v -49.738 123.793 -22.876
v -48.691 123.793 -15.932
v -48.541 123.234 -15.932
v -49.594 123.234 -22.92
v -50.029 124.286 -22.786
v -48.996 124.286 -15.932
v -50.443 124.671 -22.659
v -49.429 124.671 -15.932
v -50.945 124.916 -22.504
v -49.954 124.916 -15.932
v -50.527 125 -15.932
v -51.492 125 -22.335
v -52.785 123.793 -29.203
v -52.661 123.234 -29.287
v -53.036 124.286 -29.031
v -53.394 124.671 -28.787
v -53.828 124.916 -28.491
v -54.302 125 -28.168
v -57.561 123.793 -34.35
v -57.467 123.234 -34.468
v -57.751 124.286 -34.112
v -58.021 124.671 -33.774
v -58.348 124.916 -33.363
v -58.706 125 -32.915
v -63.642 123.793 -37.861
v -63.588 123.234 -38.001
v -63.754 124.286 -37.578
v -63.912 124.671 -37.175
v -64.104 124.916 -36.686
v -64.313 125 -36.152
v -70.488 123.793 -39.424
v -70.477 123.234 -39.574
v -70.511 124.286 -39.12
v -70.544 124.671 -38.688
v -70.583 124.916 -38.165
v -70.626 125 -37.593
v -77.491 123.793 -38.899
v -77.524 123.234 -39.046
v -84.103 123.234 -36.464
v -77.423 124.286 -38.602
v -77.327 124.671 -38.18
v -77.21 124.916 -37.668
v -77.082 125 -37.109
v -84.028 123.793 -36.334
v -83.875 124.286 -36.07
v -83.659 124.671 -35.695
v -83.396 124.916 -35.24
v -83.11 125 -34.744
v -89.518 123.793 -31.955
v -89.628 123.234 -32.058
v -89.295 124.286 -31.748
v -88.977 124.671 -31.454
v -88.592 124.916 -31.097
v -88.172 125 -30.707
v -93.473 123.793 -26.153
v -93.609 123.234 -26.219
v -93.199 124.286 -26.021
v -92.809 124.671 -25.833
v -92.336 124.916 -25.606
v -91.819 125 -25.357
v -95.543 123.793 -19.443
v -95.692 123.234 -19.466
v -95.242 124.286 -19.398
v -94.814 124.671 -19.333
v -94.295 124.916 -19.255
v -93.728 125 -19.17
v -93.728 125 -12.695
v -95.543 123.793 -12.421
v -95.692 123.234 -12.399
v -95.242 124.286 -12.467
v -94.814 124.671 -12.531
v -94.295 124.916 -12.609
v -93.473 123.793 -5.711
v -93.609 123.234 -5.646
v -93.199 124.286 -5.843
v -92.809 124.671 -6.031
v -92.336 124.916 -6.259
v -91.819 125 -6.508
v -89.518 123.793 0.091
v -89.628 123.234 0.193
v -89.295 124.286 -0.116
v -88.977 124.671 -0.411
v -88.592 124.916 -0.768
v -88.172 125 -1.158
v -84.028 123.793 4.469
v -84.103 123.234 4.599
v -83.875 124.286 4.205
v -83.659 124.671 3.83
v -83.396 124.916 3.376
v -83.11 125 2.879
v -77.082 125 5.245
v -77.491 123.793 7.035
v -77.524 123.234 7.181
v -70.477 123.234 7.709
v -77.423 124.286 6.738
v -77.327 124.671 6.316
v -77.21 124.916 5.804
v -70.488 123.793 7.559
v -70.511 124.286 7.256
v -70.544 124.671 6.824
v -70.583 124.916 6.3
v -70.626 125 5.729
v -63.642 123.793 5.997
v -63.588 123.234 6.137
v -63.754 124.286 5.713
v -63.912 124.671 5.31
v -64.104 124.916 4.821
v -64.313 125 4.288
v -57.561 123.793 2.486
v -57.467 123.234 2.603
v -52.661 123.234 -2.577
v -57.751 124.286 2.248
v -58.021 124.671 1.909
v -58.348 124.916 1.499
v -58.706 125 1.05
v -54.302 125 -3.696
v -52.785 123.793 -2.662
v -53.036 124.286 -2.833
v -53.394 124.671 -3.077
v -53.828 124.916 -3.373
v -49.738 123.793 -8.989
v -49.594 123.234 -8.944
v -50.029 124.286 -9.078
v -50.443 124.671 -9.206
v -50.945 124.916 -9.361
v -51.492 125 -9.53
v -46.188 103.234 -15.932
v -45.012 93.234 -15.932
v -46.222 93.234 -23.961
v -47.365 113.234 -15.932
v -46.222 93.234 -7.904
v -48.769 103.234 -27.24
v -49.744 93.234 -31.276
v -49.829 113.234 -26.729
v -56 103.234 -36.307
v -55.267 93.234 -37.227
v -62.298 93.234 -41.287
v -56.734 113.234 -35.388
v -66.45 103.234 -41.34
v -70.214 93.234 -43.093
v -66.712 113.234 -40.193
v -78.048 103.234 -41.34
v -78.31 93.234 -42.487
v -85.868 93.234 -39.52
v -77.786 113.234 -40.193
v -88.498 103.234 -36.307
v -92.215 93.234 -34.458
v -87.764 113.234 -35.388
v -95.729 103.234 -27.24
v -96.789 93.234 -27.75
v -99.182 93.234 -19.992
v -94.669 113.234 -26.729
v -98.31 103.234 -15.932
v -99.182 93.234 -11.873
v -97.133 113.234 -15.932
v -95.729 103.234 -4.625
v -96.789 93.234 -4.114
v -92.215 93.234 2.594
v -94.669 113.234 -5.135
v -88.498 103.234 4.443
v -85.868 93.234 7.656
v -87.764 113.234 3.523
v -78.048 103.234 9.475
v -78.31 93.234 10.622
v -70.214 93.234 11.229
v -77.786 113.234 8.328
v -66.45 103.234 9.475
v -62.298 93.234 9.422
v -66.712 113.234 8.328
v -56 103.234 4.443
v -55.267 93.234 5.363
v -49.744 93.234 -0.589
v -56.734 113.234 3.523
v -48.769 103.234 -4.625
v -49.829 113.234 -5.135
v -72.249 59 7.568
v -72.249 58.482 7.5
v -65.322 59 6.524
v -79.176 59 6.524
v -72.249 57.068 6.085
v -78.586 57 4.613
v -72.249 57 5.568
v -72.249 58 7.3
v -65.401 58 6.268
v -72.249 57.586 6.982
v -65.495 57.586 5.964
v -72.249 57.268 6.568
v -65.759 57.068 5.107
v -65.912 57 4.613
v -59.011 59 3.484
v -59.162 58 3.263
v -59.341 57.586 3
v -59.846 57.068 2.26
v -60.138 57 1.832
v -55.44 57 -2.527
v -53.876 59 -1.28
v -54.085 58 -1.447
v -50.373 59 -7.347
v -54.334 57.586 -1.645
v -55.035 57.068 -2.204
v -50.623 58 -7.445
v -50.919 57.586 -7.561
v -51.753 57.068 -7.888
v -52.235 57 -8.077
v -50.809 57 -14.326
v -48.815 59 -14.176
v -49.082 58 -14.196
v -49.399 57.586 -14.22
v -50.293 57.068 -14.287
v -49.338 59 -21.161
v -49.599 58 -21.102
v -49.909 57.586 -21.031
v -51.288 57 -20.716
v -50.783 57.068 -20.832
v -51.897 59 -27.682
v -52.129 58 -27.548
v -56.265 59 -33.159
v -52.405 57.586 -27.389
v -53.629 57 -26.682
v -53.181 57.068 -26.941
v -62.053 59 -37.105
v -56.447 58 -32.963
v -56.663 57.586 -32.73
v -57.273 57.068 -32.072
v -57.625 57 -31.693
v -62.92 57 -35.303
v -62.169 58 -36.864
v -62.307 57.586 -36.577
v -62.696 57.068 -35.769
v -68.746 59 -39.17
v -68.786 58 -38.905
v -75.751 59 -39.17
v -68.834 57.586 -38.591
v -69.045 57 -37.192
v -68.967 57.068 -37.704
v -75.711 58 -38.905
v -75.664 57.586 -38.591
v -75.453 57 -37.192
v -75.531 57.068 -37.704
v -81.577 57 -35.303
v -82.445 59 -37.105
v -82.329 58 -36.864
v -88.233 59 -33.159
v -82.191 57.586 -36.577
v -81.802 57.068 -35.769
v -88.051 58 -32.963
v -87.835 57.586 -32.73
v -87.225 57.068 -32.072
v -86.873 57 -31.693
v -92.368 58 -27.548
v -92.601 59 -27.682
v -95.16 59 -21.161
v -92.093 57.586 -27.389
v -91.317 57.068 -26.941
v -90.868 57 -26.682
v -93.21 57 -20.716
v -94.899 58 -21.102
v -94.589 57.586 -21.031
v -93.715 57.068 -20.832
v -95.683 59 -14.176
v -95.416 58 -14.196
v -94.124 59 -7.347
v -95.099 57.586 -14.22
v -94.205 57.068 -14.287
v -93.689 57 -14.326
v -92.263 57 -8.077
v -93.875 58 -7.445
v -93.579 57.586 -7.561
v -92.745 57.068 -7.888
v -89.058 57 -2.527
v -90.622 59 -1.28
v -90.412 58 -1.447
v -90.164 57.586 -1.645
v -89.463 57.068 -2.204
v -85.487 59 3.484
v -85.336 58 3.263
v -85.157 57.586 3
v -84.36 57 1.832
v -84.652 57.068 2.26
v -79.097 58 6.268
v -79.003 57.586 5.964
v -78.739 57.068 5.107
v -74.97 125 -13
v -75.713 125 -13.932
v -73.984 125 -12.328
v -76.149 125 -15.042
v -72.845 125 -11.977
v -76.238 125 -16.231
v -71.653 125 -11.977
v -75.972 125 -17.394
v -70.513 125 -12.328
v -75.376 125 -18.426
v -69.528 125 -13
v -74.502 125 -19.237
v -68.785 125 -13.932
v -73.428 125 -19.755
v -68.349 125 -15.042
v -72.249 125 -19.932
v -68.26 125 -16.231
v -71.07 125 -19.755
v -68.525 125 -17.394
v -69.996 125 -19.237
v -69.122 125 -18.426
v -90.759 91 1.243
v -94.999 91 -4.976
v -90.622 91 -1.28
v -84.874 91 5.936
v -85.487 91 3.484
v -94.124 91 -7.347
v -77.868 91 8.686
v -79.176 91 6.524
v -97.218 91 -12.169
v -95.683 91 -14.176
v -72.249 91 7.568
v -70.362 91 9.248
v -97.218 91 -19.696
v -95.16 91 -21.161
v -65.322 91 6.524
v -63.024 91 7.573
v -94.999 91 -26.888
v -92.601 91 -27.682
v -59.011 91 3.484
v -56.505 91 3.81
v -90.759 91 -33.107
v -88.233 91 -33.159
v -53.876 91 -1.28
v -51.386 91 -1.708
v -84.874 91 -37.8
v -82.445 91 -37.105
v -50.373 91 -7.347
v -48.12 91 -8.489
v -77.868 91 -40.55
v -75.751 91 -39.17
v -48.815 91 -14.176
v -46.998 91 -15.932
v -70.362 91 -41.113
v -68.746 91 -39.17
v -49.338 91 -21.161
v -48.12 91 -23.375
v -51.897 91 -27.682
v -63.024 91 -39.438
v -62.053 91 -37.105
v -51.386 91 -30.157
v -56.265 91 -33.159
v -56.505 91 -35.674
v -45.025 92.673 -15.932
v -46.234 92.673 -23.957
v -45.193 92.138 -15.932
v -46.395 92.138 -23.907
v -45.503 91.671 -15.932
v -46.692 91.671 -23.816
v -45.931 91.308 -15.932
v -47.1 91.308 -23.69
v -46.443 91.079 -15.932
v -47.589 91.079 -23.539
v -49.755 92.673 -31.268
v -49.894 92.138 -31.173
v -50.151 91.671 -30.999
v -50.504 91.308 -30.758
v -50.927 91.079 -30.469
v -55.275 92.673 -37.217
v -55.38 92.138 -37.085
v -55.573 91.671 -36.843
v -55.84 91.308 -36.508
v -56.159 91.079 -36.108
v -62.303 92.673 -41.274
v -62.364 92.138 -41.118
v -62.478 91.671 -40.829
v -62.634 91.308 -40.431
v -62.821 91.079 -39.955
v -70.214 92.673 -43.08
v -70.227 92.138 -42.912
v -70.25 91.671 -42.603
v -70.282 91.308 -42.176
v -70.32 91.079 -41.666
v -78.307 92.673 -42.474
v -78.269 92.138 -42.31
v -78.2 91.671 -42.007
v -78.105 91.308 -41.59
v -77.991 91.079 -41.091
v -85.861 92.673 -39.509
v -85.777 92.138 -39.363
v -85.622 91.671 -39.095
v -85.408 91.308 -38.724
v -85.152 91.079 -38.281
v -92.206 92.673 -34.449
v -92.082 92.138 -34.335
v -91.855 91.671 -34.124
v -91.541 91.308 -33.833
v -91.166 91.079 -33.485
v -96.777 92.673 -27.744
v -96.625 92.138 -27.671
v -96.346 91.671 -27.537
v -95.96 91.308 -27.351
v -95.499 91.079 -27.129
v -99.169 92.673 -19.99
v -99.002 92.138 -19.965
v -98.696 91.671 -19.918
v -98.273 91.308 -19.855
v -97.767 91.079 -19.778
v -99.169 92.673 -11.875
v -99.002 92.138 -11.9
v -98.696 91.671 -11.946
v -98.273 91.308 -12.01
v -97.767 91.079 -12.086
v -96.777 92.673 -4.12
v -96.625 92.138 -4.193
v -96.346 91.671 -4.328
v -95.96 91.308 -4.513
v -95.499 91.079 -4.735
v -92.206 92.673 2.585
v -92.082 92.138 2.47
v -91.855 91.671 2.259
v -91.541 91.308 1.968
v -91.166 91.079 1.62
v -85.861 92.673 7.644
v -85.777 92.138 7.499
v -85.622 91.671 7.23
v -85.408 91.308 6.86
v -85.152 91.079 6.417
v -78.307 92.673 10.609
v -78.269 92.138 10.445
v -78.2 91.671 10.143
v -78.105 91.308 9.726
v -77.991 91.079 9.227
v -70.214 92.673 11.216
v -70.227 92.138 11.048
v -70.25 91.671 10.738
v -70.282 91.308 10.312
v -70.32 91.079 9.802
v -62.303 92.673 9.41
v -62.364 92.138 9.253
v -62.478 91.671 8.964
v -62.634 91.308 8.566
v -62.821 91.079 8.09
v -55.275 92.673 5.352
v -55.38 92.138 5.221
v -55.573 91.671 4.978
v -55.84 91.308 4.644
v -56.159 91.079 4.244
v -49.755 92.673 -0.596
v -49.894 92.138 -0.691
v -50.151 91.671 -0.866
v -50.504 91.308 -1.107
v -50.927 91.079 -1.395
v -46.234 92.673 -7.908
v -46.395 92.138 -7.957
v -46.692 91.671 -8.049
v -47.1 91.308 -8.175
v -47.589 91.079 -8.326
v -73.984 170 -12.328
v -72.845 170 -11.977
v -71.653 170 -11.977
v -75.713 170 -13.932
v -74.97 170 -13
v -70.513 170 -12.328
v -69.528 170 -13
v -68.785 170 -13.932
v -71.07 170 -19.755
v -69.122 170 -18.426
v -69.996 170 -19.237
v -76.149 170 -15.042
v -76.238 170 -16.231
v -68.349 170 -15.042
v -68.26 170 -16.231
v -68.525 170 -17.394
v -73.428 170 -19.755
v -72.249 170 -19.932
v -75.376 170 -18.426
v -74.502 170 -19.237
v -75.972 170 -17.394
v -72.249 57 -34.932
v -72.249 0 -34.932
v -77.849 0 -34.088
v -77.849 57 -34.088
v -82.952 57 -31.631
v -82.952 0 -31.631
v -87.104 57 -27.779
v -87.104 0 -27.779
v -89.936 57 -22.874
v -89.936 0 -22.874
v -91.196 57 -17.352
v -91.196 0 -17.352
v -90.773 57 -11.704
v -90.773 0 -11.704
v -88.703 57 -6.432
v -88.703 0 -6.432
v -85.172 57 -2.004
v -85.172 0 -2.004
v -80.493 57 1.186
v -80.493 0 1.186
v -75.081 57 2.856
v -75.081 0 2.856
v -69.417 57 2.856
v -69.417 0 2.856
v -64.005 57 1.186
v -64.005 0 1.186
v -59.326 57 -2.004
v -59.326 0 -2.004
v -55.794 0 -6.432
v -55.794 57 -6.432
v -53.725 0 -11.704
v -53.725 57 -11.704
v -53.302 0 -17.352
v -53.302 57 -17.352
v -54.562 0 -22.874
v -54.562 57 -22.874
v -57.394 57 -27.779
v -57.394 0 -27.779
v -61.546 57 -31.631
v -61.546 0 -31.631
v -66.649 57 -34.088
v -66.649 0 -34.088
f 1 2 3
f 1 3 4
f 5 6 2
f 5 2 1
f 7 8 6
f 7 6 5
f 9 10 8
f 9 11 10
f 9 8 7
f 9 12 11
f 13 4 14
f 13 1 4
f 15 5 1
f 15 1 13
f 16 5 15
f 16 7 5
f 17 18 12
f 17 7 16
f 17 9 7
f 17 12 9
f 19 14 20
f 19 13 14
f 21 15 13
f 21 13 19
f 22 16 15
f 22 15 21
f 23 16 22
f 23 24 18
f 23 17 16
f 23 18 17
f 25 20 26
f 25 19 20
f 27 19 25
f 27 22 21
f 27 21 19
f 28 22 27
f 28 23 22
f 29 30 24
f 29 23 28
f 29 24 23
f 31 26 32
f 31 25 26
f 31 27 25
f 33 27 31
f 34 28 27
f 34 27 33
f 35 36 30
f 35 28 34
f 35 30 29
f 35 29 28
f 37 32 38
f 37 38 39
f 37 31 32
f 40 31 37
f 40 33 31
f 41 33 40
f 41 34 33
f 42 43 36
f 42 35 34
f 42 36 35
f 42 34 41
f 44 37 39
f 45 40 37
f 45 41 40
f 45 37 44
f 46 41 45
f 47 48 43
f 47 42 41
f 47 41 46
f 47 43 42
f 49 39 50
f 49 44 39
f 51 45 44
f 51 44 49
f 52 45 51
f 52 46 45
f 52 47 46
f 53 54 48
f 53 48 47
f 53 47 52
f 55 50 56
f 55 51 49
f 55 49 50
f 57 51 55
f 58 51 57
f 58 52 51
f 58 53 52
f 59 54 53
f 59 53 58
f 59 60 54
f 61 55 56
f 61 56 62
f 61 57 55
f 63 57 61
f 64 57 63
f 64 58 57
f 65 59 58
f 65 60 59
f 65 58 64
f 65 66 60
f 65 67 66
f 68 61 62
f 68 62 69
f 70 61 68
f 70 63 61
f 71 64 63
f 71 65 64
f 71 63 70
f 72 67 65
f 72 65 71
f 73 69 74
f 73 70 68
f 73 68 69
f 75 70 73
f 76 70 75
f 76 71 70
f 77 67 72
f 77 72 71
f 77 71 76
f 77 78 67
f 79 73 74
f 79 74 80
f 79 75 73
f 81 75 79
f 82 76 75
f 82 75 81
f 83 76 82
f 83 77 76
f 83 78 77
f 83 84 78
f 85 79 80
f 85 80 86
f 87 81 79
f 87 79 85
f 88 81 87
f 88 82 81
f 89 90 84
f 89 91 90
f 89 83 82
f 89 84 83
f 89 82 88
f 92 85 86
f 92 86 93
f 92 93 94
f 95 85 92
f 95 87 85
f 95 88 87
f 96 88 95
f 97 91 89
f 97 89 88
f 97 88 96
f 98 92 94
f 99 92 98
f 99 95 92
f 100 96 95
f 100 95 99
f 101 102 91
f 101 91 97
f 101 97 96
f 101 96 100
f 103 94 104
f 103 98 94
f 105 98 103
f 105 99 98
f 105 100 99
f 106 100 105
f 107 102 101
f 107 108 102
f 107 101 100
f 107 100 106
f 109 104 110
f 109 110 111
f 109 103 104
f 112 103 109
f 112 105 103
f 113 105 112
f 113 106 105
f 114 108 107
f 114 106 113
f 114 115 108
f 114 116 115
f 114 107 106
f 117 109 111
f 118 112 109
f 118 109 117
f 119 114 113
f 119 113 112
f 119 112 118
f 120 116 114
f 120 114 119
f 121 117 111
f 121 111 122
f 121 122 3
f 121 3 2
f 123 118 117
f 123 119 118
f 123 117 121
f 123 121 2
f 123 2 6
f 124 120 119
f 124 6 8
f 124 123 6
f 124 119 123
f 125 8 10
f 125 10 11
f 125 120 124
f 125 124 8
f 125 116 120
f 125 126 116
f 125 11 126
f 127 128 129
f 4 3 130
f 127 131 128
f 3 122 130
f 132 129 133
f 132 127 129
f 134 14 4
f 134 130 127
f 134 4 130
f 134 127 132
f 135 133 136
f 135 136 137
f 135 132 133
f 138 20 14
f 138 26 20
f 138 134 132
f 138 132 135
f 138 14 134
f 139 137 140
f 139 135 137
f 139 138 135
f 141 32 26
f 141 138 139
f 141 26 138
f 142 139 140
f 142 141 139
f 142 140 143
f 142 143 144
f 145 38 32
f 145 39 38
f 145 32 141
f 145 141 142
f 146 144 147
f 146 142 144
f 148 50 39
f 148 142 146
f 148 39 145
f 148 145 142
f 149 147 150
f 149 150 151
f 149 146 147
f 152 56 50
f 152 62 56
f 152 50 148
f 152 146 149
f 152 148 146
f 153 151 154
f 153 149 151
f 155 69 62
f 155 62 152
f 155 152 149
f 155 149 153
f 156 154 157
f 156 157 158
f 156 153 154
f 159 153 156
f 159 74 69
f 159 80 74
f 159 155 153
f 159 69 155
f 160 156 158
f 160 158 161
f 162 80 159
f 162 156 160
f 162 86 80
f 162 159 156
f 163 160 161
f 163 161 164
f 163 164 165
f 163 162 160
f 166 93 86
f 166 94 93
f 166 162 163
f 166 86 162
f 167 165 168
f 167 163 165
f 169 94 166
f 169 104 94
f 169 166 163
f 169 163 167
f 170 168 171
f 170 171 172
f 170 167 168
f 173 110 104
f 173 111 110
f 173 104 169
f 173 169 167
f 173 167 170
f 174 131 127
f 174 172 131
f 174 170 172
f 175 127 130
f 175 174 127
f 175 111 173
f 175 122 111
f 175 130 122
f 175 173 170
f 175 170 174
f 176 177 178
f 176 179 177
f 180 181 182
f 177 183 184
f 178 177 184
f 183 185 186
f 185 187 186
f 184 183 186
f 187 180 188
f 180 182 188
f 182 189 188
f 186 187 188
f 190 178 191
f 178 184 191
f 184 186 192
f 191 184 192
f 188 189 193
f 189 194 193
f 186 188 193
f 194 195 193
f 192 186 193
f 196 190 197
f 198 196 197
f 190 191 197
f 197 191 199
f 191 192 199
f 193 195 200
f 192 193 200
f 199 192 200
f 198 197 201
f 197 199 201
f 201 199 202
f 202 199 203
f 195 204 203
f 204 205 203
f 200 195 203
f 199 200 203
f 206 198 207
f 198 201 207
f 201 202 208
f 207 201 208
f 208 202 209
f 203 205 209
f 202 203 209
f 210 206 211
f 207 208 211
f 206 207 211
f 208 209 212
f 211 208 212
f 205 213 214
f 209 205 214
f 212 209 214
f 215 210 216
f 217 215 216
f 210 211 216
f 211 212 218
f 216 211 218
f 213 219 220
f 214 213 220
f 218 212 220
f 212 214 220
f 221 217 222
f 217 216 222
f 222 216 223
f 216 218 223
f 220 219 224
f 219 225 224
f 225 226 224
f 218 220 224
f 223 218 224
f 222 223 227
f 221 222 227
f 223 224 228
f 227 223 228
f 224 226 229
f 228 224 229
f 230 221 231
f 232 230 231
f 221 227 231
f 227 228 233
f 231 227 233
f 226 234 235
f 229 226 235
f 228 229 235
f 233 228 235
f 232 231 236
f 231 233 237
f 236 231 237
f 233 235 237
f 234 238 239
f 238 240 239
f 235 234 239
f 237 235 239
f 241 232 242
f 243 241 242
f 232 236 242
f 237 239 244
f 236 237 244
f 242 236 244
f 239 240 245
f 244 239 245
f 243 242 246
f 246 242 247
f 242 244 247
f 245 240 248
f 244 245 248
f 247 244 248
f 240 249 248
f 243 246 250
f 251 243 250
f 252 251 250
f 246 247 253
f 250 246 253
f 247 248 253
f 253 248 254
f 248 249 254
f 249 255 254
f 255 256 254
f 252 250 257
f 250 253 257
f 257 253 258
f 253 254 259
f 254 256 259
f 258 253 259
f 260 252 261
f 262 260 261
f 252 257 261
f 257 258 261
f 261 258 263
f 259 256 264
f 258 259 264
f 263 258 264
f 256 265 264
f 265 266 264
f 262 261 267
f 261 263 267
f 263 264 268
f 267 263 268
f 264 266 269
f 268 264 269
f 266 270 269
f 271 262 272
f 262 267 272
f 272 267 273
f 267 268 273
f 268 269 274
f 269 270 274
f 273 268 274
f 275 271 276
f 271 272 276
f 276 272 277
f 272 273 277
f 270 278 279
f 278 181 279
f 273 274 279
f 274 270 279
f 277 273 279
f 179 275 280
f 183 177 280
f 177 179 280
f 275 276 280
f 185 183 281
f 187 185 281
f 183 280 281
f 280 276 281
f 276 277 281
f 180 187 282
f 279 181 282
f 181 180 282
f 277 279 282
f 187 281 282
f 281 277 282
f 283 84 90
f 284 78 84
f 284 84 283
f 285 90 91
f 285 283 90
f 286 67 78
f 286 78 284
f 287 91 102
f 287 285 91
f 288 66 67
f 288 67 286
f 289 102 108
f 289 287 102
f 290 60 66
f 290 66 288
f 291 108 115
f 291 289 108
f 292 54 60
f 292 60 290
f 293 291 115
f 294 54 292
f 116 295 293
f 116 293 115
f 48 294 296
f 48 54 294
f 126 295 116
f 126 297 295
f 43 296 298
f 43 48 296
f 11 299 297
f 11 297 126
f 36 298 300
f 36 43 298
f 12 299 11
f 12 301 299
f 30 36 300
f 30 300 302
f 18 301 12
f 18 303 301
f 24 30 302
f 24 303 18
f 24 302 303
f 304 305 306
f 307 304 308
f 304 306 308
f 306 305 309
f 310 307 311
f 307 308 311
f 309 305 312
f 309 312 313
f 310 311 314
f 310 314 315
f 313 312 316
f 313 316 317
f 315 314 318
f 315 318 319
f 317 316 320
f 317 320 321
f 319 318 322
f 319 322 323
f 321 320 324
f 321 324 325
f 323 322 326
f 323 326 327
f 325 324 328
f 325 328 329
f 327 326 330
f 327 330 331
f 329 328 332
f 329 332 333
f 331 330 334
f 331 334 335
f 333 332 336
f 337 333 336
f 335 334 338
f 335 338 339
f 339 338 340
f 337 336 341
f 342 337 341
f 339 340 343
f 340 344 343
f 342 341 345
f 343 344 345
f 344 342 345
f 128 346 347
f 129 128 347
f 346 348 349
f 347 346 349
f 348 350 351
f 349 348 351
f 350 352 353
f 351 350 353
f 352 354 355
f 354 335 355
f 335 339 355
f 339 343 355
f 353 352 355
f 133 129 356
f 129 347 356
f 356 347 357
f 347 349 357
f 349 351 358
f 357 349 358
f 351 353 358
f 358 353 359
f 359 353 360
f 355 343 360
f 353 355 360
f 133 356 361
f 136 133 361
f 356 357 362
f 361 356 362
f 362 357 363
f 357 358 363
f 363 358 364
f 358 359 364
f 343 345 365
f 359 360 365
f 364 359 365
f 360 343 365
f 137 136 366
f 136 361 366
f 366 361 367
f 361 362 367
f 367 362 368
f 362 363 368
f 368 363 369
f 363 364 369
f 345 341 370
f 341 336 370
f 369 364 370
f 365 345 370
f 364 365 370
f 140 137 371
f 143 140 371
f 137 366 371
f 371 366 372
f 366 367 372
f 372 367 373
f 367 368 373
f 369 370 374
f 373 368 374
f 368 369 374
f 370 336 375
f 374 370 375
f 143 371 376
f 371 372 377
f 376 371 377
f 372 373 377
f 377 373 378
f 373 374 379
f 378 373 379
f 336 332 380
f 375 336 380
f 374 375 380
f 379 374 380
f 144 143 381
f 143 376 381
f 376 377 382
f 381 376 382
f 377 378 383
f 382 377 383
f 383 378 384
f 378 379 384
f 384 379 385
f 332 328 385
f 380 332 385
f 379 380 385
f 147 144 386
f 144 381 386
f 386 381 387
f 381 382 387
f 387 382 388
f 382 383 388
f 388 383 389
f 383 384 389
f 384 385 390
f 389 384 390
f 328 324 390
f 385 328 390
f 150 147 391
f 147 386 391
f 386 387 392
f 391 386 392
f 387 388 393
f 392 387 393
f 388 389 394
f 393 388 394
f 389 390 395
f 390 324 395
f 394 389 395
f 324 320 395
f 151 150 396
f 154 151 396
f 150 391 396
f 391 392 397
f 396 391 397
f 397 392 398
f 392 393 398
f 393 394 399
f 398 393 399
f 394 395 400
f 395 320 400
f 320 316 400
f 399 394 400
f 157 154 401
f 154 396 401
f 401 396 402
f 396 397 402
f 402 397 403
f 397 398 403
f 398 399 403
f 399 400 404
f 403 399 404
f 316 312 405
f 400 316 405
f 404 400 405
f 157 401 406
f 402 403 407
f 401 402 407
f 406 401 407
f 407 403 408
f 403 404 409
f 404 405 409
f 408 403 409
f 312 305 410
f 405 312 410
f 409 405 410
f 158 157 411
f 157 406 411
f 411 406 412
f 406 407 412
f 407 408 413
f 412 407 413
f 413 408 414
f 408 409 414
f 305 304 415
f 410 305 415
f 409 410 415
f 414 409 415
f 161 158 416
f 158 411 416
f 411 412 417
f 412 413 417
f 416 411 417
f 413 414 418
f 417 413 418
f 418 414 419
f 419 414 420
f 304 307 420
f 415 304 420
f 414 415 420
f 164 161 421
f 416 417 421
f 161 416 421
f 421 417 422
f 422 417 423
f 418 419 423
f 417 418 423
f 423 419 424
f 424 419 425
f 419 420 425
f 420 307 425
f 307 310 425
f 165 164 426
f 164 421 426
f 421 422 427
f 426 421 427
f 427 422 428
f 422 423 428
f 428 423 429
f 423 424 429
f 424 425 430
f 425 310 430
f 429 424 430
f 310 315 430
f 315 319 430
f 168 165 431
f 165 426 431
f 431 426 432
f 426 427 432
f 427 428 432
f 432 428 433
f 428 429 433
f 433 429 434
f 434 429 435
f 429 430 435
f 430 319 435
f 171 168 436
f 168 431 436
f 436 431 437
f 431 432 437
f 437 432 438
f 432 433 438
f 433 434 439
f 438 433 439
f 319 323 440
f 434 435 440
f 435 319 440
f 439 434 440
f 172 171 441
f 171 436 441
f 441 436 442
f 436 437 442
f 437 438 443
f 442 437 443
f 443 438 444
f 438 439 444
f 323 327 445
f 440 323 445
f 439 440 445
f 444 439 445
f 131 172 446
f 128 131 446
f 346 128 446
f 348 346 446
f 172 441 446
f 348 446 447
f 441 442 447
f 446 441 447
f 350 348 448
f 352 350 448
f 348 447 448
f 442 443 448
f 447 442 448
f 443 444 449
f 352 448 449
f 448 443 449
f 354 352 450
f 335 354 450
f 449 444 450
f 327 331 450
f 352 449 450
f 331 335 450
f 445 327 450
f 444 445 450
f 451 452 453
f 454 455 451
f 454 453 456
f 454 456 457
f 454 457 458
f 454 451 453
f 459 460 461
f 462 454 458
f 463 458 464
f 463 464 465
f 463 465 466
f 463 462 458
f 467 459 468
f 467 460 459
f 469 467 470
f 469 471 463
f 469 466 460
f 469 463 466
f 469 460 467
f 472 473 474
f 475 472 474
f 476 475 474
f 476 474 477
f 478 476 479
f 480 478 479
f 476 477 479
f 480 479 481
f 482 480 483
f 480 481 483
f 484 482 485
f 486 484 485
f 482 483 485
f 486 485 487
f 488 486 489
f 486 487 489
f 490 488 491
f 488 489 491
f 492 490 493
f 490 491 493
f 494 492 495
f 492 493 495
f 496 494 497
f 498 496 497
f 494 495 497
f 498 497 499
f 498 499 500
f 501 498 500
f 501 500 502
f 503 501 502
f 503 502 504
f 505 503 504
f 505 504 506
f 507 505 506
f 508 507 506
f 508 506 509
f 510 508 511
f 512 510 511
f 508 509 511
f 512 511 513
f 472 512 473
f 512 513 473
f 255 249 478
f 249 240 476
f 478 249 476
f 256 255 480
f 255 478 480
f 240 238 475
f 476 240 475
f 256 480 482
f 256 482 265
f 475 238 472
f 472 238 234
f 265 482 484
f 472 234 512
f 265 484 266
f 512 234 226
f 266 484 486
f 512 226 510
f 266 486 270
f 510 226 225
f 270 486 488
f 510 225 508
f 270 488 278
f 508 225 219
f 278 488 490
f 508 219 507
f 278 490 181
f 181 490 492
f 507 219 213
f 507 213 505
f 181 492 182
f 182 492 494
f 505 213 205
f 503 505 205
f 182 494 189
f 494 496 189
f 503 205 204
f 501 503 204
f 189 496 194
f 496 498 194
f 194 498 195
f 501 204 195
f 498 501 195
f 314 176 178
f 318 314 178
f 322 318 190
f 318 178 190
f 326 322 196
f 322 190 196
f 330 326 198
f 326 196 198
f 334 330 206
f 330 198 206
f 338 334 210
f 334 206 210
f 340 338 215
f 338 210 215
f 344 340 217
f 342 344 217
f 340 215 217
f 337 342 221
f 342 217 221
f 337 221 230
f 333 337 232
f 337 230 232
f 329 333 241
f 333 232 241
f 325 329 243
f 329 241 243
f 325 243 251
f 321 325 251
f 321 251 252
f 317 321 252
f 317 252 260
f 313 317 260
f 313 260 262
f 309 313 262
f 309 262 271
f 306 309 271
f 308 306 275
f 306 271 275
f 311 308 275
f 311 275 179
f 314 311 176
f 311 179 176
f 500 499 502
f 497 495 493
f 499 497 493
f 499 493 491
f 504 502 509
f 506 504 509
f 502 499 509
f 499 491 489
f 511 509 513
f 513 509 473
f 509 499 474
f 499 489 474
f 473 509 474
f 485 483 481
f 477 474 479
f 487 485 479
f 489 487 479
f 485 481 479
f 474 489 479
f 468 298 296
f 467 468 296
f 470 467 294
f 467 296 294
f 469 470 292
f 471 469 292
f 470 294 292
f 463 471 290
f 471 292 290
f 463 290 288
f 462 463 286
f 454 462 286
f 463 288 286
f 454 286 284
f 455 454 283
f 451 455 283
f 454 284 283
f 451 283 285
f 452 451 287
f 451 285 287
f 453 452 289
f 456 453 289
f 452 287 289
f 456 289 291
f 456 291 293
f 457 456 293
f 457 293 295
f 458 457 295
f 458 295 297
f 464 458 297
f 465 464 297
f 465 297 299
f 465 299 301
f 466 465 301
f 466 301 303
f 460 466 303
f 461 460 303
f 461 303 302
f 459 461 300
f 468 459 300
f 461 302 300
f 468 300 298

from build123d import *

# Parameters (mm, degrees)
SKETCH1_R           = 19
BOSS_EXTRUDE1_DEPTH = 57
SKETCH2_R           = 23.5
BOSS_EXTRUDE2_DEPTH = 34
SKETCH3_R           = 27.5
SKETCH4_R           = 23.5
SKETCH5_R           = 4
BOSS_EXTRUDE3_DEPTH = 45
FILLET1_R           = 2


with BuildPart() as part:
    # Sketch1 → Boss-Extrude1 (new body)
    with BuildSketch(Plane(origin=(0, 0, 0), x_dir=(1, 0, 0), z_dir=(0, 1, 0))):
        with Locations(Location((-72.248941829, 15.932254861, 0), (0, 0, 90))):
            Circle(SKETCH1_R)
    extrude(amount=BOSS_EXTRUDE1_DEPTH)

    # Sketch2 → Boss-Extrude2 (add)
    with BuildSketch(Plane(origin=(0, 57, 0), x_dir=(1, 0, 0), z_dir=(0, 1, 0))):
        with Locations(Location((-72.248941829, 15.932254861, 0), (0, 0, 270))):
            Circle(SKETCH2_R)
    extrude(amount=BOSS_EXTRUDE2_DEPTH)

    # Sketch3 → Loft1 section 0
    with BuildSketch(Plane(origin=(0, 91, 0), x_dir=(1, 0, 0), z_dir=(0, 1, 0))):
        with Locations((-72.248941829, 15.932254861)):
            Circle(SKETCH3_R)
    # Sketch4 → Loft1 section 1
    with BuildSketch(Plane(origin=(0, 125, 0), x_dir=(1, 0, 0), z_dir=(0, 1, 0))):
        with Locations((-72.248941829, 15.932254861)):
            Circle(SKETCH4_R)
    loft()

    # Sketch5 → Boss-Extrude3 (add)
    with BuildSketch(Plane(origin=(0, 125, 0), x_dir=(1, 0, 0), z_dir=(0, 1, 0))):
        with Locations(Location((-72.248941829, 15.932254861, 0), (0, 0, 90))):
            Circle(SKETCH5_R)
    extrude(amount=BOSS_EXTRUDE3_DEPTH)

    # Fillet1
    fillet1_edges = [part.edges().sort_by_distance(p)[0] for p in [
        (-95.748941829, 125, -15.932254861),
        (-99.748941829, 91, -15.932254861),
        (-72.248941829, 57, -39.432254861),
    ]]
    fillet(fillet1_edges, radius=FILLET1_R)


solid = part.part
